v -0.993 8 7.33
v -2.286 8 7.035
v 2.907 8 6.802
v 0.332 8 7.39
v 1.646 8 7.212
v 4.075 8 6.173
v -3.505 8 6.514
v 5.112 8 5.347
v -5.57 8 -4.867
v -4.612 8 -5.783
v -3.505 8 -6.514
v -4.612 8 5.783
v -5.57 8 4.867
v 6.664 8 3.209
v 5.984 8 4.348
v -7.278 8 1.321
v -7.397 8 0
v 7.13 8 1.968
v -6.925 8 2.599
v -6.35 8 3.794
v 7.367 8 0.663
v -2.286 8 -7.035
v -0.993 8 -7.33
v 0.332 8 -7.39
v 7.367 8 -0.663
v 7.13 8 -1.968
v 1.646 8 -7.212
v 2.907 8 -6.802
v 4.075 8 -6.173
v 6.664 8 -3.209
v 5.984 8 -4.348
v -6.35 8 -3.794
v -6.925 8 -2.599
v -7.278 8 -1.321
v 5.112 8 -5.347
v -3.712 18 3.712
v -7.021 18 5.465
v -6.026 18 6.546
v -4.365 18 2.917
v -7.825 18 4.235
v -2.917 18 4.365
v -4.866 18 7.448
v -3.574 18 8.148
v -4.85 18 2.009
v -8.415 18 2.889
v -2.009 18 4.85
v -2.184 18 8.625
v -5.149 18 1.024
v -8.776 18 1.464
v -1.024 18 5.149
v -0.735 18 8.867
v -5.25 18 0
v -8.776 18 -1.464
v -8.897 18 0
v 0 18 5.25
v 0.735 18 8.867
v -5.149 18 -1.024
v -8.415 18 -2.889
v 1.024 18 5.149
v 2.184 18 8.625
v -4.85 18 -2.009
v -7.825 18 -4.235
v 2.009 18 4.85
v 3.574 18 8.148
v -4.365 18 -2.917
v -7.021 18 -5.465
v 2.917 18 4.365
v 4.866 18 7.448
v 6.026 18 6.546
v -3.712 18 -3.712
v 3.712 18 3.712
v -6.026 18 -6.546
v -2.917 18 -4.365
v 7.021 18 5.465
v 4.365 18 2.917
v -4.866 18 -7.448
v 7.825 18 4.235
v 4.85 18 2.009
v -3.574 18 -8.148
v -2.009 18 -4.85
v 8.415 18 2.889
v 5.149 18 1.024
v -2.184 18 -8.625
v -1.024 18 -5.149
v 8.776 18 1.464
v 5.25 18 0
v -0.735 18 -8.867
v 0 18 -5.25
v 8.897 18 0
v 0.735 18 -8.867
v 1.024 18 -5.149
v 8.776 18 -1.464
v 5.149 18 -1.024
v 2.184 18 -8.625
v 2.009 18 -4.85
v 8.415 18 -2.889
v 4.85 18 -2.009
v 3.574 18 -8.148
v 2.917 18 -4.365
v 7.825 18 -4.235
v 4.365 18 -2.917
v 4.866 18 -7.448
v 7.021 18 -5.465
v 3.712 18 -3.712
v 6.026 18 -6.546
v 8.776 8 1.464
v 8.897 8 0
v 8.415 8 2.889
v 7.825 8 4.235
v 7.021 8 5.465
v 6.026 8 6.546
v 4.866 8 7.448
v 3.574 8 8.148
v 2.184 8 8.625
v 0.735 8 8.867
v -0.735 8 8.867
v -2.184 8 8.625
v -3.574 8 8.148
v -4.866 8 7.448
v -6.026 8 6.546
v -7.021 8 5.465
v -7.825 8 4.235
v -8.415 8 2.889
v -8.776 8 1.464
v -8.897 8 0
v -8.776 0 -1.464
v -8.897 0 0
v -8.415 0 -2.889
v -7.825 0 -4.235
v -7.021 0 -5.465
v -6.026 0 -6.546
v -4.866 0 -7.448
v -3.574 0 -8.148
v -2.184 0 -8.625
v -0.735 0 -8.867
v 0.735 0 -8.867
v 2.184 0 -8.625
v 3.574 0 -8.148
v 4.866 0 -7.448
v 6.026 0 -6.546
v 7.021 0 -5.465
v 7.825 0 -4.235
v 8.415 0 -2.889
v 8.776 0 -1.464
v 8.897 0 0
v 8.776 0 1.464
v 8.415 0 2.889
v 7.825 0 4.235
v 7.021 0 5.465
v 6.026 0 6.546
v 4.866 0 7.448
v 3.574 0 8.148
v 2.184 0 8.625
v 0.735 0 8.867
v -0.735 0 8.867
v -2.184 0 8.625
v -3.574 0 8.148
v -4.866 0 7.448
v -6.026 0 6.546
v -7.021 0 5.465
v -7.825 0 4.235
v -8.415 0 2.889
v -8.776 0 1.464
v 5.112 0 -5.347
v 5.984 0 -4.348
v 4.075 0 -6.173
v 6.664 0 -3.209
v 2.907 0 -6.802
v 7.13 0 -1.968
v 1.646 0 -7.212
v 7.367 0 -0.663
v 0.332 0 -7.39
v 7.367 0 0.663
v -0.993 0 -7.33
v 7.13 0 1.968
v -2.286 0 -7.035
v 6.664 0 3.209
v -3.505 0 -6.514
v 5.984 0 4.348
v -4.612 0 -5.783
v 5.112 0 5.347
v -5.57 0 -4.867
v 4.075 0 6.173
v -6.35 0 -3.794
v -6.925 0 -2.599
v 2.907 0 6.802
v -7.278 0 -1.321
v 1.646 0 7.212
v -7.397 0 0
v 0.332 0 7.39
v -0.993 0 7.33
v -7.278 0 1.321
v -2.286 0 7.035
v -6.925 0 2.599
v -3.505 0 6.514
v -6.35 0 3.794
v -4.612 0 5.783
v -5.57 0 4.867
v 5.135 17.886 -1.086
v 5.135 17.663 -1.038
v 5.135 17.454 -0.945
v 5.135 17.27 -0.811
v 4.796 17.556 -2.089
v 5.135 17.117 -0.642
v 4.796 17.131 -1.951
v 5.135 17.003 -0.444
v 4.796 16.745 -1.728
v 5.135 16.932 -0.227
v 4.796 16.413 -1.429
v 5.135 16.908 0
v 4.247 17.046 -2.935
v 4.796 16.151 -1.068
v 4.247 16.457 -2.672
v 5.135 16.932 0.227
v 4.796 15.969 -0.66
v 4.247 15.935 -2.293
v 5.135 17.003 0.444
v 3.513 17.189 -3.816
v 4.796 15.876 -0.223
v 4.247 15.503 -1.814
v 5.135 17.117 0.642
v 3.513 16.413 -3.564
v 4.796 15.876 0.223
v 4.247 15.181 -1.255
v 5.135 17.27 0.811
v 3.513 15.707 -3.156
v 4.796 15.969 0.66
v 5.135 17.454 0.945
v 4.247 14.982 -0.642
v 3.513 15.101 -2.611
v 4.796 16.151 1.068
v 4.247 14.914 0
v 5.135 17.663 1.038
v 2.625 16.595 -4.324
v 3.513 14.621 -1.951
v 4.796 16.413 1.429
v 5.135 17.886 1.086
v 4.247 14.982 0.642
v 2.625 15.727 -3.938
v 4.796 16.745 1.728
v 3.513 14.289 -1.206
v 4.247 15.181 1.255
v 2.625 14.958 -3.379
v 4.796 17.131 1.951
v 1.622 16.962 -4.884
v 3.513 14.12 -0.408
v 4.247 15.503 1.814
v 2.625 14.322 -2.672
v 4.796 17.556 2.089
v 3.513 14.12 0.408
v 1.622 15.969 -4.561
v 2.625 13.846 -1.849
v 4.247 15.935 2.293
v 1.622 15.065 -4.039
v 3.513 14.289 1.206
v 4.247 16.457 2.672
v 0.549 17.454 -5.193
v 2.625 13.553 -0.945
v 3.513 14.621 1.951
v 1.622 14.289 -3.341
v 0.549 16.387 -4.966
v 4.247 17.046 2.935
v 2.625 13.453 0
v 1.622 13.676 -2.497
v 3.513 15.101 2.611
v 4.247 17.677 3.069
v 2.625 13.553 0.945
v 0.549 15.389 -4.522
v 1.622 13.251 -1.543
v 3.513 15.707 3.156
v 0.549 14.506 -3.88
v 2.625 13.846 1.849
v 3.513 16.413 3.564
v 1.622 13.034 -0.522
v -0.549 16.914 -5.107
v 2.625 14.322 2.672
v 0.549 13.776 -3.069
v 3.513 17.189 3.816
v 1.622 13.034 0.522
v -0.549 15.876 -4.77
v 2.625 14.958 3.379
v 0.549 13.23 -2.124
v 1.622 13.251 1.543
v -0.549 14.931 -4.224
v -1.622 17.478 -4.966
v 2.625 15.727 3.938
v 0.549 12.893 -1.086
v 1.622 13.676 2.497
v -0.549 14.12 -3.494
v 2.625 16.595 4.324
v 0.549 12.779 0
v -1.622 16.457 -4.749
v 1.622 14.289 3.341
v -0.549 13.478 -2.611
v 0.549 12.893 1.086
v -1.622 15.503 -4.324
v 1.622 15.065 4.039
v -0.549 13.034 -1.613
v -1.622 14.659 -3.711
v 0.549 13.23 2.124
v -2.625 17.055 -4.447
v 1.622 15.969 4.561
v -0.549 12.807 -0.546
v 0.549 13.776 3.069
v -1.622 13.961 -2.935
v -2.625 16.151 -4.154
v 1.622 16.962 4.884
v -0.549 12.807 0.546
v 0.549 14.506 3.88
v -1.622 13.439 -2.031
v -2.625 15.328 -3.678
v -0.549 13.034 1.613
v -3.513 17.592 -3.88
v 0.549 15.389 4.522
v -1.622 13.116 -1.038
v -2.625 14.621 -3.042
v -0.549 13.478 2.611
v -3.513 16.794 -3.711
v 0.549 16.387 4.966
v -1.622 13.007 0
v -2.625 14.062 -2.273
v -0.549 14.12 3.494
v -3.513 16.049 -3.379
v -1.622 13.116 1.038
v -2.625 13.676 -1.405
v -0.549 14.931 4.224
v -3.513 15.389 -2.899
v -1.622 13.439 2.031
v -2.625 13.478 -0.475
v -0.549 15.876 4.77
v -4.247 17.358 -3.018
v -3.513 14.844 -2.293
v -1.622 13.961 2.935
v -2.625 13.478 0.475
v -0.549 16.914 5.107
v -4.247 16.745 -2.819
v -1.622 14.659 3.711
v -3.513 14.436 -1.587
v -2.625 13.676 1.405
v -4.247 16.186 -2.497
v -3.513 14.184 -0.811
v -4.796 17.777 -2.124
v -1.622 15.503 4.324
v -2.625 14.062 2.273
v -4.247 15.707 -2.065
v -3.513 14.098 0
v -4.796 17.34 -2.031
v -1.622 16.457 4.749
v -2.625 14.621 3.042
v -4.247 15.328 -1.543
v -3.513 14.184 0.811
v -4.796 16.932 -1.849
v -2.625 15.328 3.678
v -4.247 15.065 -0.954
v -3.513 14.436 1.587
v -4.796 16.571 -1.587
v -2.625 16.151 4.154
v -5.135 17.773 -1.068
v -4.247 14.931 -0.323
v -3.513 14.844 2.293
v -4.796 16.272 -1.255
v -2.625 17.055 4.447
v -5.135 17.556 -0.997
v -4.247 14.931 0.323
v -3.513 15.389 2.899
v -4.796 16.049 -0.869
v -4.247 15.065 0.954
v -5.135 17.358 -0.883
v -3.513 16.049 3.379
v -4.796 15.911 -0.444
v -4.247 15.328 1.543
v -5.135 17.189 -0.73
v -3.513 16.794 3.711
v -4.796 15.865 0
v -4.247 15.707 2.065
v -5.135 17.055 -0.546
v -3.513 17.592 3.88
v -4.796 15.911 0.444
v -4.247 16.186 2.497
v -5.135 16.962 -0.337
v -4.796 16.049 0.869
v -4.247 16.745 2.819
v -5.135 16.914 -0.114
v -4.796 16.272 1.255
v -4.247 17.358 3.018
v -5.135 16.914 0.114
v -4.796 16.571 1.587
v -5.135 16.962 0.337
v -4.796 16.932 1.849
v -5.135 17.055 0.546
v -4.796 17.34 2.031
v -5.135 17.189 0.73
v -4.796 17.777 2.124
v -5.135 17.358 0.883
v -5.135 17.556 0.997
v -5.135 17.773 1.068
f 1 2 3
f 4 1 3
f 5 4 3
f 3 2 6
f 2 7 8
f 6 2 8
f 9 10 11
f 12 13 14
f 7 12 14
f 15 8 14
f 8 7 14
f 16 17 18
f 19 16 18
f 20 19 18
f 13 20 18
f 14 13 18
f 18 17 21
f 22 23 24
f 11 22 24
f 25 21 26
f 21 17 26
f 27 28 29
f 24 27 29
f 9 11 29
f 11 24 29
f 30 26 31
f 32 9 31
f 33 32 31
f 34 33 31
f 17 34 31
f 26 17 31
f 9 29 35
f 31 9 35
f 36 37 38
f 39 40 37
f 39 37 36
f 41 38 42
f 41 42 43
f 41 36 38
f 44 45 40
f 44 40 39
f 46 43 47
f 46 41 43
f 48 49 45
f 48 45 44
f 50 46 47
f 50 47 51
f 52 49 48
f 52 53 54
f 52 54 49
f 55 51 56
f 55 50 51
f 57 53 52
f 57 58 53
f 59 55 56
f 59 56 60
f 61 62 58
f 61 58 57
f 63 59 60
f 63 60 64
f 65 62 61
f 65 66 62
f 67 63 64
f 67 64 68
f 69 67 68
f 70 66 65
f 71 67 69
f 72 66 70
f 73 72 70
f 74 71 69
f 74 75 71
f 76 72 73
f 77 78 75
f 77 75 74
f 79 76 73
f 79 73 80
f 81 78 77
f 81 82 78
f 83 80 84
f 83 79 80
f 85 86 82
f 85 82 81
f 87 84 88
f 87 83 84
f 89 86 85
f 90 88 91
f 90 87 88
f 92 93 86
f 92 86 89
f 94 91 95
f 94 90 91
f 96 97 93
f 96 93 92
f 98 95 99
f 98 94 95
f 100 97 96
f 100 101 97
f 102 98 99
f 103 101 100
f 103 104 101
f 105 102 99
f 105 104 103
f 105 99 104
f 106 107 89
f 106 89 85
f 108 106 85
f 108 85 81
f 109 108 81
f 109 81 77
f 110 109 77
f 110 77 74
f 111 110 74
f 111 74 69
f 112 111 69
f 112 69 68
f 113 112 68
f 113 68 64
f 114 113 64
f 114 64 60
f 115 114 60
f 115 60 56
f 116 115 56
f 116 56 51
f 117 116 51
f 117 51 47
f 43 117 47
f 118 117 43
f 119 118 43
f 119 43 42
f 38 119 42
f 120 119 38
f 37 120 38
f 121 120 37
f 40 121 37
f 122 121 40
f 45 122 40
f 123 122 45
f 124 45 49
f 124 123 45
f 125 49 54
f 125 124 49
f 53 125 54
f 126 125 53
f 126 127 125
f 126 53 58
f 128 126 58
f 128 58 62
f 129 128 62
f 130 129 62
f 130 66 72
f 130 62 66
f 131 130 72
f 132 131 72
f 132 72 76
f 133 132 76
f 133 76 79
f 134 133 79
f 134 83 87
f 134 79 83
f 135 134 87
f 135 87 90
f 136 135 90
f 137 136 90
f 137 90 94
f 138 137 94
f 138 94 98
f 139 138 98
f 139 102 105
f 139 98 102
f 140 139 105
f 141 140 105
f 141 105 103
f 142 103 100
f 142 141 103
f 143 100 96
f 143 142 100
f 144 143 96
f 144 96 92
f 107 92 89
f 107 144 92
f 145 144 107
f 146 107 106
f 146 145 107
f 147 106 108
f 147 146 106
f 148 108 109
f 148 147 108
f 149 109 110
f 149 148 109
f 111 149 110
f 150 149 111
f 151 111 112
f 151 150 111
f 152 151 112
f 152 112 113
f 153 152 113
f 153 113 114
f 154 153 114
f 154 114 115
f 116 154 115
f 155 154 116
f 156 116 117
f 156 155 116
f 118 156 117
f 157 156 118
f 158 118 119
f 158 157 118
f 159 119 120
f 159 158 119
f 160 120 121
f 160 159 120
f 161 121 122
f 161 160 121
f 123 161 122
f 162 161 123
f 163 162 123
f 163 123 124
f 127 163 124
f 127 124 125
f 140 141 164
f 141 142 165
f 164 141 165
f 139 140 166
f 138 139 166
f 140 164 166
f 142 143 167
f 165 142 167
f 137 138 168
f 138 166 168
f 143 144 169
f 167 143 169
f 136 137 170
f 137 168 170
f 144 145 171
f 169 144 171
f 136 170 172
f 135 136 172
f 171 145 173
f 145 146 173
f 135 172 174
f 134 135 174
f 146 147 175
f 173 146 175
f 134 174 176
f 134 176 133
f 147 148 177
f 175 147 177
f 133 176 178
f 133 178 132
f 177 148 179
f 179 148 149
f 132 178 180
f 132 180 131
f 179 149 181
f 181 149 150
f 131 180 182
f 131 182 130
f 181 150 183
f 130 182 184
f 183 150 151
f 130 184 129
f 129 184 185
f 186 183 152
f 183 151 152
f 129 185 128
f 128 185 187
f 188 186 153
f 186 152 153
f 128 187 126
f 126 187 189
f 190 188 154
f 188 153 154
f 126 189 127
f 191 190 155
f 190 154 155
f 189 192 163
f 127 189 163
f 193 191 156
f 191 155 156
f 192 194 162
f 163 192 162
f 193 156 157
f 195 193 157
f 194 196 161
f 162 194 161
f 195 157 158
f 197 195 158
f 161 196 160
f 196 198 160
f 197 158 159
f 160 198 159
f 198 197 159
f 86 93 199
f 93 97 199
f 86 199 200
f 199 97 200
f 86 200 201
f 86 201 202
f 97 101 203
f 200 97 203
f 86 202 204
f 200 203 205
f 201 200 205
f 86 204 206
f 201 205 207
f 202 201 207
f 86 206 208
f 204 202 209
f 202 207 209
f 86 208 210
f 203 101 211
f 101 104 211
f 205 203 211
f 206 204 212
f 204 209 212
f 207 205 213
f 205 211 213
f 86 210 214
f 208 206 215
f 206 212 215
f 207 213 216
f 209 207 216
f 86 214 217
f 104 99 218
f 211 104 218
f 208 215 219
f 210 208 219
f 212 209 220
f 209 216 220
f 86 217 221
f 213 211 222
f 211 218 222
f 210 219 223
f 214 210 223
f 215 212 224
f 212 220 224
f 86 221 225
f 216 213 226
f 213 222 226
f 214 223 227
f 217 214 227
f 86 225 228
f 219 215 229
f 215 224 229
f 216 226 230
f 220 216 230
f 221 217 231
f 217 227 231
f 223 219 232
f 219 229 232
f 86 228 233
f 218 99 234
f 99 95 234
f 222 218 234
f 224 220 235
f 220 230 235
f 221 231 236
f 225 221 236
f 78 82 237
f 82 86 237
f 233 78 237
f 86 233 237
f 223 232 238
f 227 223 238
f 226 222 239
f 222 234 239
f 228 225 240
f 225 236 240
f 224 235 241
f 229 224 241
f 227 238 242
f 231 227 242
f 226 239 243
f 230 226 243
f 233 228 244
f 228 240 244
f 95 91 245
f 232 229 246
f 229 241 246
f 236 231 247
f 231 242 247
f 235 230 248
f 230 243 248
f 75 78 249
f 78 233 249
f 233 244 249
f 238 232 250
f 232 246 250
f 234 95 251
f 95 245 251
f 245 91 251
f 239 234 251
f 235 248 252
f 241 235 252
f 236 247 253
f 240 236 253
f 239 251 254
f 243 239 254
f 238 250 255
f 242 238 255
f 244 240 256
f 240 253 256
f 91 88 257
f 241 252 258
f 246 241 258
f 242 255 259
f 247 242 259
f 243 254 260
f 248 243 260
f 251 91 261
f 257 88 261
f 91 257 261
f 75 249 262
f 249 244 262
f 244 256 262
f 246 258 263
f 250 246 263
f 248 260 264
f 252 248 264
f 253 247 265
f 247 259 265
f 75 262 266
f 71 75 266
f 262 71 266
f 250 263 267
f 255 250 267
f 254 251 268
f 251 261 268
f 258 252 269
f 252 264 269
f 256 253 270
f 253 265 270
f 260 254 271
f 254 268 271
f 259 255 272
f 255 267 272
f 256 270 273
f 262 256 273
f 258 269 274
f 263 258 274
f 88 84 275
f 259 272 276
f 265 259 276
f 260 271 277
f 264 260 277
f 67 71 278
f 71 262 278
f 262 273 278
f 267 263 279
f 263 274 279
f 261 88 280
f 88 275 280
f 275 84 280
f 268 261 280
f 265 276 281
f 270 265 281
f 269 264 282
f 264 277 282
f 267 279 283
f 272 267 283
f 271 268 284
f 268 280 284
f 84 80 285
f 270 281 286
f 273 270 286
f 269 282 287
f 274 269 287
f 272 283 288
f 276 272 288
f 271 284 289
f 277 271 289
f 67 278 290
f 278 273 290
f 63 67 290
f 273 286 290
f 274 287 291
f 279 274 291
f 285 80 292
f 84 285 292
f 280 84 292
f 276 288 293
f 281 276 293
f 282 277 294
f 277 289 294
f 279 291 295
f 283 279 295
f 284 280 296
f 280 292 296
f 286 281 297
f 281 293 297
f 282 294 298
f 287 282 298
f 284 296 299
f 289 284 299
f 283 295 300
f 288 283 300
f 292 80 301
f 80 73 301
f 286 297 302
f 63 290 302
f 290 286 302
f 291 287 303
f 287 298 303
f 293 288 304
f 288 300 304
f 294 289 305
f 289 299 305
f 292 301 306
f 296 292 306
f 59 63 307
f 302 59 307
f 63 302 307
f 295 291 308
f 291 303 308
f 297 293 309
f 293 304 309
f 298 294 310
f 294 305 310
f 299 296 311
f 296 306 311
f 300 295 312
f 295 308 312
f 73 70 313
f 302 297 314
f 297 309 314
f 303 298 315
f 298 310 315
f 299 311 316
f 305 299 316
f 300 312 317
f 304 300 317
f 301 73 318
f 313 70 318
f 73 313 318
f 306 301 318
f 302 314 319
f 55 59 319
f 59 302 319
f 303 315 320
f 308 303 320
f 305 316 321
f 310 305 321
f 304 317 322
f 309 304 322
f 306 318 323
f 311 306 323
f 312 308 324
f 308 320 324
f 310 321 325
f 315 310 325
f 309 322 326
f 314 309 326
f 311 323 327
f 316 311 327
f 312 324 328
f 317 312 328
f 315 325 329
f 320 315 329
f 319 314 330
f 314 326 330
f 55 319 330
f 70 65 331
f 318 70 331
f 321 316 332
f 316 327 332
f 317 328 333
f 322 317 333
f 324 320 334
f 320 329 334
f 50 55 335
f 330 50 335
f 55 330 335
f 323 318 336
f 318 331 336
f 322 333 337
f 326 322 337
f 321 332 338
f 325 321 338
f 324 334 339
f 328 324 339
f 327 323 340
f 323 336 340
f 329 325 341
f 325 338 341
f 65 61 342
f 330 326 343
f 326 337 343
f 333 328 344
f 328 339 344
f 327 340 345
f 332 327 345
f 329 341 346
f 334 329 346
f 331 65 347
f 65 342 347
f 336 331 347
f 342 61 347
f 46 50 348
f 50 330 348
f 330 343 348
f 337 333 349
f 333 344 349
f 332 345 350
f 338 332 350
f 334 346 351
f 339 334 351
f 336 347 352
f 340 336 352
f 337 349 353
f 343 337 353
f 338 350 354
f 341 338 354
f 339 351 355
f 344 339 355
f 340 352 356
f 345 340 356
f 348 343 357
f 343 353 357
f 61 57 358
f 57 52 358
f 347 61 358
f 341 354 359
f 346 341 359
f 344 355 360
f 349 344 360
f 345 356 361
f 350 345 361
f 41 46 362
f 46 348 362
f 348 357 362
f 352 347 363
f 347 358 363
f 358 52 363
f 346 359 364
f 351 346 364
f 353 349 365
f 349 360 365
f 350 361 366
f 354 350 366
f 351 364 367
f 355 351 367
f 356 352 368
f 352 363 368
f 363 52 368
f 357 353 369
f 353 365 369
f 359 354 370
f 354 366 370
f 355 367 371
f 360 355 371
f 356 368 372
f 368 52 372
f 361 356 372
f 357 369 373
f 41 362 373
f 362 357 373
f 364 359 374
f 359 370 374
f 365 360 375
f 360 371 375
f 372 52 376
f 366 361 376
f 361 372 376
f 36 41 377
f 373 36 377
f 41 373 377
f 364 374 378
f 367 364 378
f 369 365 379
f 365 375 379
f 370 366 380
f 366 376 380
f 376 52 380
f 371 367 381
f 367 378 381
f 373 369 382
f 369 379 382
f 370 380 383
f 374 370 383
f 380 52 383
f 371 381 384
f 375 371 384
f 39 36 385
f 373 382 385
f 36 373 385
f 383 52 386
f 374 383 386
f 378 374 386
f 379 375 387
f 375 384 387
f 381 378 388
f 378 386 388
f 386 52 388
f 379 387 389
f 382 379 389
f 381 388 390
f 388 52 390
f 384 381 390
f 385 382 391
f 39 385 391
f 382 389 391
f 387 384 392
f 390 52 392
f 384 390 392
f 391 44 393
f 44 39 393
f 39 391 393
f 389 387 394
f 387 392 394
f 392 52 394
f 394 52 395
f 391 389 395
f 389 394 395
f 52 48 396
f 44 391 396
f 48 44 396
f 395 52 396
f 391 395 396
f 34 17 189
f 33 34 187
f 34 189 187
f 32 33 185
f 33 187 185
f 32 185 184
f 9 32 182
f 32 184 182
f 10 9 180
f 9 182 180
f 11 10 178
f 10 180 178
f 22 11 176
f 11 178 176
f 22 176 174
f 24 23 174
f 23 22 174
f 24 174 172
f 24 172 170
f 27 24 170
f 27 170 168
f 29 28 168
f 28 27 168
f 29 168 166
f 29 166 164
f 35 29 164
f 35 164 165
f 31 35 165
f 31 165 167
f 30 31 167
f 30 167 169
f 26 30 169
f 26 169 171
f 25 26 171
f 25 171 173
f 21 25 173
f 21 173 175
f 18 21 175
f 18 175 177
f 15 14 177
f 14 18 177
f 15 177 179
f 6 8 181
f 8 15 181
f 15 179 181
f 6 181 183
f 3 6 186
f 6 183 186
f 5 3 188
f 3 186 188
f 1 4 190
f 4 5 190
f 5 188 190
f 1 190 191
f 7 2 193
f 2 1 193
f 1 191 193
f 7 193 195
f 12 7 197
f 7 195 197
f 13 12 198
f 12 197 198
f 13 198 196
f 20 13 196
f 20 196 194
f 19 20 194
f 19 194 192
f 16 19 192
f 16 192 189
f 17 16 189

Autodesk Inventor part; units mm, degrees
ref_plane "YZ Plane" through (0, 0, 0) normal (1, 0, 0) x (0, 1, 0)
ref_plane "XZ Plane" through (0, 0, 0) normal (0, 1, 0) x (-1, 0, 0)
ref_plane "XY Plane" through (0, 0, 0) normal (0, 0, 1) x (1, 0, 0)
sketch "Sketch1" plane through (0, 0, 0) normal (0, 1, 0) x (-1, 0, 0)
  point P0 (0, 0)
sketch "Sketch2" plane through (0, 0, 0) normal (0, 1, 0) x (-1, 0, 0)
  circle A0 centre (0, 0) radius 8.897
  circle A1 centre (0, 0) radius 7.397
  dimension "d0" = 17.794
  dimension "d1" = 14.794
extrude "Extrusion1" add sketch "Sketch2" along normal blind 8
sketch "Sketch3" plane through (0, 8, 0) normal (0, 1, 0) x (1, 0, 0)
  circle A0 centre (0, 0) radius 8.897
extrude "Extrusion2" add sketch "Sketch3" along normal blind 10
sketch "Sketch4" plane through (0, 18, 0) normal (0, 1, 0) x (1, 0, 0)
  arc A0 (5.25, 0) -> (-5.25, 0) centre (0, 0) ccw
  line L0 (-5.25, 0) -> (5.25, 0)
  dimension "d6" = 10.5
revolve "Revolution1" cut sketch "Sketch4" angle 360 about axis through (-5.25, 18, 0) along (-1, 0, 0)
sketch "Sketch5" plane through (0, 18, 0) normal (0, 1, 0) x (1, 0, 0)
  point P0 (0, 0)
